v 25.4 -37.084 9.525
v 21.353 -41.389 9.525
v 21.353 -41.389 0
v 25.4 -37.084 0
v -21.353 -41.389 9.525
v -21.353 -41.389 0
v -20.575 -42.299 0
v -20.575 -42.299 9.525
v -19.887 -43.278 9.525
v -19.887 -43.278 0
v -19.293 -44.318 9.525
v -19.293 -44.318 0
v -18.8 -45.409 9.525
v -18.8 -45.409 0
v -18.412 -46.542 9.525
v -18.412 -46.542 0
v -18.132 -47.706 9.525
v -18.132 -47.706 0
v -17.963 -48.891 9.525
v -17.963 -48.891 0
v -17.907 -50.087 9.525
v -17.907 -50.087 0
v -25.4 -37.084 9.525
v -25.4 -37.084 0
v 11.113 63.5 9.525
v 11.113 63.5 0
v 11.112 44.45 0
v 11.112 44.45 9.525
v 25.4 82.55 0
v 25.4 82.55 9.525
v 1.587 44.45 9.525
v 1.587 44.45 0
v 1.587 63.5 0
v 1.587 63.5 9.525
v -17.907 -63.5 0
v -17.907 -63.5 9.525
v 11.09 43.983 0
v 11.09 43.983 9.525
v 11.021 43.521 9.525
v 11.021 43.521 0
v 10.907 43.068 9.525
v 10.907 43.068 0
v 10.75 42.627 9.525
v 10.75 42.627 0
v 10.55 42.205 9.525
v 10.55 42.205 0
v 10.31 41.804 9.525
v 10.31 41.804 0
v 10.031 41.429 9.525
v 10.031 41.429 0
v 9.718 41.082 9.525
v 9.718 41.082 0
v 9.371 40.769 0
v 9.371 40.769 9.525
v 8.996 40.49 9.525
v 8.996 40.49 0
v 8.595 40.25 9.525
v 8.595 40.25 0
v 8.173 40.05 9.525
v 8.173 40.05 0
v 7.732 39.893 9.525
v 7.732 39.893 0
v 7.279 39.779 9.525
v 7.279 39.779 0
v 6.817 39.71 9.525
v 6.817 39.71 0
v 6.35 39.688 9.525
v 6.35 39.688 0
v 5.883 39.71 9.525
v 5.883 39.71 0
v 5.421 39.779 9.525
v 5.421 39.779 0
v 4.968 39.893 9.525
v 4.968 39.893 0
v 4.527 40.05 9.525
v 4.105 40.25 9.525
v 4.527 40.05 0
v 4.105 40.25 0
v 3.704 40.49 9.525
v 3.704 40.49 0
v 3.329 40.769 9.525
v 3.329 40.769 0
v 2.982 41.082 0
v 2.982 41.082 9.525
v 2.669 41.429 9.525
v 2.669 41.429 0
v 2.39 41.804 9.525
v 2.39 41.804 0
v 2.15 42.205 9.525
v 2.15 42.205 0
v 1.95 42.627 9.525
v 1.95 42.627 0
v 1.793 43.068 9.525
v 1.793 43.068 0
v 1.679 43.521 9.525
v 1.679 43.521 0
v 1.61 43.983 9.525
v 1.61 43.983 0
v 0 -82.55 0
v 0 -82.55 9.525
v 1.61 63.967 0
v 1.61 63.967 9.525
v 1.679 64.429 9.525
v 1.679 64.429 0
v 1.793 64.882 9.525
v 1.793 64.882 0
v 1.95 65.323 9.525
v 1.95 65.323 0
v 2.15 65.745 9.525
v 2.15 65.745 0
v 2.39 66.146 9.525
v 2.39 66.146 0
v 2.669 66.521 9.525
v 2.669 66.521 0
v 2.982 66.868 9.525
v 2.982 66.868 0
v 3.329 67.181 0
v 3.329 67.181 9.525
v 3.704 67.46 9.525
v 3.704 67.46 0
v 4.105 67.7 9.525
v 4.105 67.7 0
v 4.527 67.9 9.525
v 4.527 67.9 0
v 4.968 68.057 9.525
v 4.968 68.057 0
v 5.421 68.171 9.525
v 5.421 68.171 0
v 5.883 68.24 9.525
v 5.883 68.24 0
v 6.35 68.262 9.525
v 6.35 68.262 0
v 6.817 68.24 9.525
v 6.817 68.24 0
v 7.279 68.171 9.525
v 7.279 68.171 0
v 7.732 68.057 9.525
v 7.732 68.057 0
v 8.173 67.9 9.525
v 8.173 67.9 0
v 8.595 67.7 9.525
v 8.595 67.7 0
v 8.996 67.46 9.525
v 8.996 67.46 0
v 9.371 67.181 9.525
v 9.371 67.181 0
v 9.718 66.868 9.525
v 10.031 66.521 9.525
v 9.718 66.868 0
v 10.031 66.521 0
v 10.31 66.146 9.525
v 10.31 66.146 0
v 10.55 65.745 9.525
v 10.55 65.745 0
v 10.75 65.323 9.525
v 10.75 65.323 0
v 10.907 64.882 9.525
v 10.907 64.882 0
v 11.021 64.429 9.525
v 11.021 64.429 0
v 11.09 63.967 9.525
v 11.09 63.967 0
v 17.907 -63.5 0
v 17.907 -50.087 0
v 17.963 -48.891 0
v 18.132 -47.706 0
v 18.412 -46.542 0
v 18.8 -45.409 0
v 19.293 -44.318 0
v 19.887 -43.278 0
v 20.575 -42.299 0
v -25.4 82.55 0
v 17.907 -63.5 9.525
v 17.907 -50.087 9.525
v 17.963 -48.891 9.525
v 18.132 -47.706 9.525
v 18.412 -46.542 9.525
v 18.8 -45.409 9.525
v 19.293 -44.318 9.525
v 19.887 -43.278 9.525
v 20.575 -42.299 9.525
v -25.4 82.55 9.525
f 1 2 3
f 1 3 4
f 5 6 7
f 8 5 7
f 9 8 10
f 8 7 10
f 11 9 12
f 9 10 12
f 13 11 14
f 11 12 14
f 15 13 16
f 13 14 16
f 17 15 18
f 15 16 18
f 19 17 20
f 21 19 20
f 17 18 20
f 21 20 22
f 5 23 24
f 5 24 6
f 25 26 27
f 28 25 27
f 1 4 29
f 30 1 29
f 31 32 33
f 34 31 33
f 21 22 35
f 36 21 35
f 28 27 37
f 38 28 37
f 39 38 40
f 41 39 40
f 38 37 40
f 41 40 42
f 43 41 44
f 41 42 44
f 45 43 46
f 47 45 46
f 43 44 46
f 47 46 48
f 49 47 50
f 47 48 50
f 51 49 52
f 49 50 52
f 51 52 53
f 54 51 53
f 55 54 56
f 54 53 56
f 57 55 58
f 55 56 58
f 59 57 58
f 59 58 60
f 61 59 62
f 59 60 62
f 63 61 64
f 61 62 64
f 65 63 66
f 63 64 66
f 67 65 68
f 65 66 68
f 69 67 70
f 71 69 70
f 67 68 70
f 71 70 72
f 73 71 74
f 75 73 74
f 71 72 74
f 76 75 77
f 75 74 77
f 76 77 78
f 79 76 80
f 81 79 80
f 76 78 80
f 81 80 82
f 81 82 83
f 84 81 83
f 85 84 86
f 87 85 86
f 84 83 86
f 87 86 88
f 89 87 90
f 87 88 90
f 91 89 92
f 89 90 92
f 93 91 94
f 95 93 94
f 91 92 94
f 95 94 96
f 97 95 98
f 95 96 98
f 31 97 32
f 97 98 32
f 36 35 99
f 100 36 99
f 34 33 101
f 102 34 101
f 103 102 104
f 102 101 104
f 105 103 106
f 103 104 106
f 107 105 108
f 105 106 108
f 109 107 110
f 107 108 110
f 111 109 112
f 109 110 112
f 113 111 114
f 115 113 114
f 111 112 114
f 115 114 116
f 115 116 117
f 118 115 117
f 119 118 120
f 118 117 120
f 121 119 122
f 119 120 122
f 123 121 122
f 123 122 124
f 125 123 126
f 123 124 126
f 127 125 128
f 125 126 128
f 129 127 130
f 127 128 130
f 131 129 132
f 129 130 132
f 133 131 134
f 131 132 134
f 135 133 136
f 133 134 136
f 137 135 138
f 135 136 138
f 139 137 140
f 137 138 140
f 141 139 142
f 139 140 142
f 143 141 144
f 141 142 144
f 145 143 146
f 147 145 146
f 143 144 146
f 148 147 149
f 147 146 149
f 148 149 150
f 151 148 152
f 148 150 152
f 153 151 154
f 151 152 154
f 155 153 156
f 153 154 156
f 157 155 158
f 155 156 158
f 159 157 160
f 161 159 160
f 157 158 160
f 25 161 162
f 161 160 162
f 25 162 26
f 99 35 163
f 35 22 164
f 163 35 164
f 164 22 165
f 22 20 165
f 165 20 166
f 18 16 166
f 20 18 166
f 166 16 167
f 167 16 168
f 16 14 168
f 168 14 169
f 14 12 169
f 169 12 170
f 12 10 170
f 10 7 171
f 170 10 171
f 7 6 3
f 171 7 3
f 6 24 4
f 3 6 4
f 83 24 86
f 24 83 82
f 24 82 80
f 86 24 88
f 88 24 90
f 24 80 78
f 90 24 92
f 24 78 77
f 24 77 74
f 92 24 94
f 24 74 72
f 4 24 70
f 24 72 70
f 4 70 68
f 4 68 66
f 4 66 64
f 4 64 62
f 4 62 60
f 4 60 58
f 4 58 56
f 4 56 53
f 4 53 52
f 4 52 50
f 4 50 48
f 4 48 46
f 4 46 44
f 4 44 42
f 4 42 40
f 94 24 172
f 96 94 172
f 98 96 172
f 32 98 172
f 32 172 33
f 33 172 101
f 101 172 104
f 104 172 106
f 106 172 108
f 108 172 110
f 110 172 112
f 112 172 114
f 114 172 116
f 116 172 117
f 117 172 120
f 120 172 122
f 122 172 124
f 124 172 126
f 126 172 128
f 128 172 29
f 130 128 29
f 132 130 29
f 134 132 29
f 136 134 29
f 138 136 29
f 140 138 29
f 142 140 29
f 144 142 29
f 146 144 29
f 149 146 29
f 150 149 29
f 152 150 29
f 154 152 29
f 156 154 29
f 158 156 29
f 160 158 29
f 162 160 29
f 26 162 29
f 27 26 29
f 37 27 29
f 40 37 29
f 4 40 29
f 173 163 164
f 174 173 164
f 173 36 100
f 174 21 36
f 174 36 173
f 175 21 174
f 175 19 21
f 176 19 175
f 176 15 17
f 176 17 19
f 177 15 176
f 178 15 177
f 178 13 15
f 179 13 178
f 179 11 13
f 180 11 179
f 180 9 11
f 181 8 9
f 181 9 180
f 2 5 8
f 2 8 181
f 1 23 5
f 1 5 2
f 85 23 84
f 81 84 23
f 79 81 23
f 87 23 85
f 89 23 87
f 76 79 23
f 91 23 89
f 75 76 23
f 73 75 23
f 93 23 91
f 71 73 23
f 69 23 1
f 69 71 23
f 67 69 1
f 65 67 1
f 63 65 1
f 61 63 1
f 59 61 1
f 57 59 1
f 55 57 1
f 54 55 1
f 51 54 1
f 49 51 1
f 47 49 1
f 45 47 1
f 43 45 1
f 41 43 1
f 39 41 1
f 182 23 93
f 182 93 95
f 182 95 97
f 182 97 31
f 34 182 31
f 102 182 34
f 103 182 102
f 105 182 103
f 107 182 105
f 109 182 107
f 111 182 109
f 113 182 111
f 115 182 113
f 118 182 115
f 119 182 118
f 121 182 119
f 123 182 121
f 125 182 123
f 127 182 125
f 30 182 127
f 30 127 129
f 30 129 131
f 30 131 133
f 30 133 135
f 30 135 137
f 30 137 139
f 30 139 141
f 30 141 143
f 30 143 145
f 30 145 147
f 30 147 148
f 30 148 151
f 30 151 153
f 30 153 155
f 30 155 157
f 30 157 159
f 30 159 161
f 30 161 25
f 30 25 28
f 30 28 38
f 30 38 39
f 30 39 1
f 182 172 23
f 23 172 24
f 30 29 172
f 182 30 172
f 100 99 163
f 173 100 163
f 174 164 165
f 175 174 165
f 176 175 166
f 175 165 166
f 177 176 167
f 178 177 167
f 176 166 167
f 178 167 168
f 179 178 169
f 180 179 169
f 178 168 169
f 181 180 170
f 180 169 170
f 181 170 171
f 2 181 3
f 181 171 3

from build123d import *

# Parameters (mm, degrees)
F1_DEPTH = 9.525


with BuildPart() as f1:
    # F0 (on Top) → F1 (new body)
    with BuildSketch(Plane.XY):
        with BuildLine():
            Line((25.4, -37.084), (25.4, 82.55))
            Line((25.4, 82.55), (-25.4, 82.55))
            Line((-25.4, 82.55), (-25.4, -37.084))
            Line((-25.4, -37.084), (-21.353429, -41.388863))
            ThreePointArc((-21.353429, -41.388863), (-18.800003, -45.409099), (-17.907, -50.08722))
            Line((-17.907, -50.08722), (-17.907, -63.5))
            Line((-17.907, -63.5), (0, -82.55))
            Line((0, -82.55), (17.907, -63.5))
            Line((17.907, -63.5), (17.907, -50.08722))
            ThreePointArc((17.907, -50.08722), (18.800003, -45.409099), (21.353429, -41.388863))
            Line((21.353429, -41.388863), (25.4, -37.084))
        make_face()
        with BuildLine():
            ThreePointArc((1.5875, 63.5), (6.35, 68.2625), (11.1125, 63.5))
            Line((11.1125, 63.5), (11.1125, 44.45))
            ThreePointArc((11.1125, 44.45), (6.35, 39.6875), (1.5875, 44.45))
            Line((1.5875, 44.45), (1.5875, 63.5))
        make_face(mode=Mode.SUBTRACT)
    extrude(amount=F1_DEPTH)


solid = f1.part
